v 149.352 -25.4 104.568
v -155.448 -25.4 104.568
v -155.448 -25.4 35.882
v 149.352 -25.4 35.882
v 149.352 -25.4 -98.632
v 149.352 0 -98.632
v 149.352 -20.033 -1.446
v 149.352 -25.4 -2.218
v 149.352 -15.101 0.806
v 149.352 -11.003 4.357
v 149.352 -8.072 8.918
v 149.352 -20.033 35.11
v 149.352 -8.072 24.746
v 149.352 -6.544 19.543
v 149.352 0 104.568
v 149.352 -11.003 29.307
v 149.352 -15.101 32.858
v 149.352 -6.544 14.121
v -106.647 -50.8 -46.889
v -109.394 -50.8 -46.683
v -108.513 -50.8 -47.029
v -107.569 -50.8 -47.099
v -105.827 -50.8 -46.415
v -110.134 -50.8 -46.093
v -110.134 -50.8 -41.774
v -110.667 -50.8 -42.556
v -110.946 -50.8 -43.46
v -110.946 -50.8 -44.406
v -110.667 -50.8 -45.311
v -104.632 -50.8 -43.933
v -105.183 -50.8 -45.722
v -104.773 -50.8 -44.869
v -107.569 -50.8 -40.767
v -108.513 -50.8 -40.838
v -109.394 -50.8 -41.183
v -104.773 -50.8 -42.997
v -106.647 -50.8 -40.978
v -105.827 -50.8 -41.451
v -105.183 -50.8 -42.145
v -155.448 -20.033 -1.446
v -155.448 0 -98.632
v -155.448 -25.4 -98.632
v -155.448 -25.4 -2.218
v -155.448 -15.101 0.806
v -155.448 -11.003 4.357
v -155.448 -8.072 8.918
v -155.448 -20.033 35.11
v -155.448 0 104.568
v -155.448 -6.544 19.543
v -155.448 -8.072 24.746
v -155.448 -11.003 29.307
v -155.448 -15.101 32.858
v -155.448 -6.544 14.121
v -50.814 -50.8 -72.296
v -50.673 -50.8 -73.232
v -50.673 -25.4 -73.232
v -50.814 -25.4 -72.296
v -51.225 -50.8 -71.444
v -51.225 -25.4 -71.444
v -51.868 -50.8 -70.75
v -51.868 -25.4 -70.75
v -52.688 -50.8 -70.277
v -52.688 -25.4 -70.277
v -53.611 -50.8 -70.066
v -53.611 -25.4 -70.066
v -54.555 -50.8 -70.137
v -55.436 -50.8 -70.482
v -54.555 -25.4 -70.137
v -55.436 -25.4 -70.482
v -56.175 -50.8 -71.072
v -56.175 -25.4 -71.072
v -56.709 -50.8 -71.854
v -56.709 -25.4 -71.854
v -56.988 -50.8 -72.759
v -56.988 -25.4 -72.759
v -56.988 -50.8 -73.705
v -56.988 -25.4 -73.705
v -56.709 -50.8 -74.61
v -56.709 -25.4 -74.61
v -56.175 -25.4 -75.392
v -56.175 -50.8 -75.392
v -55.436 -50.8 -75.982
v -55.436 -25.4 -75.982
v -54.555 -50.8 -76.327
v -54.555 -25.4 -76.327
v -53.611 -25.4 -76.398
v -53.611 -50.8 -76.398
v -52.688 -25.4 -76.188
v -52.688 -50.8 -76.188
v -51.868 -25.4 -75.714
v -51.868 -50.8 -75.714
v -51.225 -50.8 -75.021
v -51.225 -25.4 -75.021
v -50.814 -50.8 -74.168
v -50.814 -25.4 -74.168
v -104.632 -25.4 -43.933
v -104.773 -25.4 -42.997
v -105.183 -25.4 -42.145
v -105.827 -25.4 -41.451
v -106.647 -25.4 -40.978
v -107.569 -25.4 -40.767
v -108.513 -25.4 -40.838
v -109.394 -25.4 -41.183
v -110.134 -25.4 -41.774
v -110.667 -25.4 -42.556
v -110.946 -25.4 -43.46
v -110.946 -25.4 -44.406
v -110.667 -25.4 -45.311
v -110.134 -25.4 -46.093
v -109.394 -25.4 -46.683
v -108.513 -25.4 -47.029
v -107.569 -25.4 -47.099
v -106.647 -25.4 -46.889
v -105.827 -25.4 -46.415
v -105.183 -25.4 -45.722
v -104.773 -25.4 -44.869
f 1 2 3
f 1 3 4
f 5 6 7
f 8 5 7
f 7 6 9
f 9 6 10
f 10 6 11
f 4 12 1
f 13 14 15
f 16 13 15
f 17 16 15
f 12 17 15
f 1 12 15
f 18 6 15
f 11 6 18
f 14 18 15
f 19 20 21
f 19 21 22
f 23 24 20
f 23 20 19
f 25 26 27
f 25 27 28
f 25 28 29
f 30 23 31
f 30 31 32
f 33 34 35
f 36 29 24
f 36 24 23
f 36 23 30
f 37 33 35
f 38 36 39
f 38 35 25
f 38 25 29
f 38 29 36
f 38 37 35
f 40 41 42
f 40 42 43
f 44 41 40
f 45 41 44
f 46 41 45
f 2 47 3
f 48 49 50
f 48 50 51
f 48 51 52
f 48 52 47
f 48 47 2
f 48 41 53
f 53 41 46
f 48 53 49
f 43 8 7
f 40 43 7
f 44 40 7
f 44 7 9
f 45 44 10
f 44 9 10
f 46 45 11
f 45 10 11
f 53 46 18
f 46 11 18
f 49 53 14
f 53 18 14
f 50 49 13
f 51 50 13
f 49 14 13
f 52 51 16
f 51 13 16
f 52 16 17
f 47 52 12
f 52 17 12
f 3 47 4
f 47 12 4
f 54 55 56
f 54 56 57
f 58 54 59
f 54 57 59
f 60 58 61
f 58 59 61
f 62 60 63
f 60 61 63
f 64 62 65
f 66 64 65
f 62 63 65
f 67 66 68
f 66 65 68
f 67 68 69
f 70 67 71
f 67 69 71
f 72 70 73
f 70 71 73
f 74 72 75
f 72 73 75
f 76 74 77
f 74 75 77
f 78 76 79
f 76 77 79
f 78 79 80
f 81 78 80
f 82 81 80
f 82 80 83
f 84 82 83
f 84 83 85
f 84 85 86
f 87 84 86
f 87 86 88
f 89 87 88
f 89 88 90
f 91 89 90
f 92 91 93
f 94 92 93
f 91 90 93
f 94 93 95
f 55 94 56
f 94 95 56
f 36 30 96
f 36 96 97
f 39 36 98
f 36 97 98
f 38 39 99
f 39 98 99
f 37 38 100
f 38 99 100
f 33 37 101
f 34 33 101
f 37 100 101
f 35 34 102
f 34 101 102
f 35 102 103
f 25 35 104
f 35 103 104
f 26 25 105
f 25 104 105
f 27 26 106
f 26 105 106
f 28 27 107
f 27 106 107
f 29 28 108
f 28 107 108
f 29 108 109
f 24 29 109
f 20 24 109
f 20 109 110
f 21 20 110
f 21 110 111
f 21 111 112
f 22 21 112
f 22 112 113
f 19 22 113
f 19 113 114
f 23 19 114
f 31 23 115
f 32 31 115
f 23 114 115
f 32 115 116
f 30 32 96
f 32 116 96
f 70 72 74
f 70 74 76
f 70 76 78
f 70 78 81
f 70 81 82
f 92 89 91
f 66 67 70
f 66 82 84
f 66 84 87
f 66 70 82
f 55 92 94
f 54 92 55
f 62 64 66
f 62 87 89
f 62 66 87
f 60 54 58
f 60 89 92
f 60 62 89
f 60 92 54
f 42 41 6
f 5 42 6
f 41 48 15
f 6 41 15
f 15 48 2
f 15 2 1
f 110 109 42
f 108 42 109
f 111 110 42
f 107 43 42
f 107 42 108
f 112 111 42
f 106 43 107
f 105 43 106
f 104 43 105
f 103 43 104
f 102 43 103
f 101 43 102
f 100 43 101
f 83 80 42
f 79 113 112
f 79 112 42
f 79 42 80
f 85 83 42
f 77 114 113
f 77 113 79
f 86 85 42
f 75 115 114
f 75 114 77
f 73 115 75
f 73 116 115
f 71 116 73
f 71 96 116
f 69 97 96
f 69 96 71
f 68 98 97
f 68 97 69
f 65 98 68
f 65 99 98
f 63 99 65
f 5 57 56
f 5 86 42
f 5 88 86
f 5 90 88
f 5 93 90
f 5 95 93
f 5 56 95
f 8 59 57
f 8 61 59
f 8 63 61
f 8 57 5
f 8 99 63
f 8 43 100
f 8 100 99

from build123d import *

# Parameters (mm, degrees)
F0_W     = 304.8
F0_H     = 203.2
F1_DEPTH = 25.4
F2_R     = 3.175
F3_DEPTH = 25.4


with BuildPart() as f1:
    # F0 (on Front) → F1 (new body)
    with BuildSketch(Plane.XZ):
        with Locations((-3.048005, 2.967953)):
            Rectangle(F0_W, F0_H)
    extrude(amount=F1_DEPTH)

    # F2 (on face) → F3 (join)
    with BuildSketch(Plane.XZ.offset(25.4)):
        with Locations((-53.848005, -73.232047)):
            Circle(F2_R)
        with Locations((-107.806627, -43.933121)):
            Circle(F2_R)
    extrude(amount=F3_DEPTH)

    # F4 (on face) → F5 (revolve, cut)
    with BuildSketch(Plane.XZ.offset(25.4)):
        Polygon((149.351995, 16.831879), (-155.448005, 16.831879), (-155.448005, -2.218121), (-76.879319, -2.218121), (149.351995, -2.218121), align=None)
    revolve(axis=Axis((-3.048005, -25.4, 16.831879), (1, 0, 0)), mode=Mode.SUBTRACT)


solid = f1.part
